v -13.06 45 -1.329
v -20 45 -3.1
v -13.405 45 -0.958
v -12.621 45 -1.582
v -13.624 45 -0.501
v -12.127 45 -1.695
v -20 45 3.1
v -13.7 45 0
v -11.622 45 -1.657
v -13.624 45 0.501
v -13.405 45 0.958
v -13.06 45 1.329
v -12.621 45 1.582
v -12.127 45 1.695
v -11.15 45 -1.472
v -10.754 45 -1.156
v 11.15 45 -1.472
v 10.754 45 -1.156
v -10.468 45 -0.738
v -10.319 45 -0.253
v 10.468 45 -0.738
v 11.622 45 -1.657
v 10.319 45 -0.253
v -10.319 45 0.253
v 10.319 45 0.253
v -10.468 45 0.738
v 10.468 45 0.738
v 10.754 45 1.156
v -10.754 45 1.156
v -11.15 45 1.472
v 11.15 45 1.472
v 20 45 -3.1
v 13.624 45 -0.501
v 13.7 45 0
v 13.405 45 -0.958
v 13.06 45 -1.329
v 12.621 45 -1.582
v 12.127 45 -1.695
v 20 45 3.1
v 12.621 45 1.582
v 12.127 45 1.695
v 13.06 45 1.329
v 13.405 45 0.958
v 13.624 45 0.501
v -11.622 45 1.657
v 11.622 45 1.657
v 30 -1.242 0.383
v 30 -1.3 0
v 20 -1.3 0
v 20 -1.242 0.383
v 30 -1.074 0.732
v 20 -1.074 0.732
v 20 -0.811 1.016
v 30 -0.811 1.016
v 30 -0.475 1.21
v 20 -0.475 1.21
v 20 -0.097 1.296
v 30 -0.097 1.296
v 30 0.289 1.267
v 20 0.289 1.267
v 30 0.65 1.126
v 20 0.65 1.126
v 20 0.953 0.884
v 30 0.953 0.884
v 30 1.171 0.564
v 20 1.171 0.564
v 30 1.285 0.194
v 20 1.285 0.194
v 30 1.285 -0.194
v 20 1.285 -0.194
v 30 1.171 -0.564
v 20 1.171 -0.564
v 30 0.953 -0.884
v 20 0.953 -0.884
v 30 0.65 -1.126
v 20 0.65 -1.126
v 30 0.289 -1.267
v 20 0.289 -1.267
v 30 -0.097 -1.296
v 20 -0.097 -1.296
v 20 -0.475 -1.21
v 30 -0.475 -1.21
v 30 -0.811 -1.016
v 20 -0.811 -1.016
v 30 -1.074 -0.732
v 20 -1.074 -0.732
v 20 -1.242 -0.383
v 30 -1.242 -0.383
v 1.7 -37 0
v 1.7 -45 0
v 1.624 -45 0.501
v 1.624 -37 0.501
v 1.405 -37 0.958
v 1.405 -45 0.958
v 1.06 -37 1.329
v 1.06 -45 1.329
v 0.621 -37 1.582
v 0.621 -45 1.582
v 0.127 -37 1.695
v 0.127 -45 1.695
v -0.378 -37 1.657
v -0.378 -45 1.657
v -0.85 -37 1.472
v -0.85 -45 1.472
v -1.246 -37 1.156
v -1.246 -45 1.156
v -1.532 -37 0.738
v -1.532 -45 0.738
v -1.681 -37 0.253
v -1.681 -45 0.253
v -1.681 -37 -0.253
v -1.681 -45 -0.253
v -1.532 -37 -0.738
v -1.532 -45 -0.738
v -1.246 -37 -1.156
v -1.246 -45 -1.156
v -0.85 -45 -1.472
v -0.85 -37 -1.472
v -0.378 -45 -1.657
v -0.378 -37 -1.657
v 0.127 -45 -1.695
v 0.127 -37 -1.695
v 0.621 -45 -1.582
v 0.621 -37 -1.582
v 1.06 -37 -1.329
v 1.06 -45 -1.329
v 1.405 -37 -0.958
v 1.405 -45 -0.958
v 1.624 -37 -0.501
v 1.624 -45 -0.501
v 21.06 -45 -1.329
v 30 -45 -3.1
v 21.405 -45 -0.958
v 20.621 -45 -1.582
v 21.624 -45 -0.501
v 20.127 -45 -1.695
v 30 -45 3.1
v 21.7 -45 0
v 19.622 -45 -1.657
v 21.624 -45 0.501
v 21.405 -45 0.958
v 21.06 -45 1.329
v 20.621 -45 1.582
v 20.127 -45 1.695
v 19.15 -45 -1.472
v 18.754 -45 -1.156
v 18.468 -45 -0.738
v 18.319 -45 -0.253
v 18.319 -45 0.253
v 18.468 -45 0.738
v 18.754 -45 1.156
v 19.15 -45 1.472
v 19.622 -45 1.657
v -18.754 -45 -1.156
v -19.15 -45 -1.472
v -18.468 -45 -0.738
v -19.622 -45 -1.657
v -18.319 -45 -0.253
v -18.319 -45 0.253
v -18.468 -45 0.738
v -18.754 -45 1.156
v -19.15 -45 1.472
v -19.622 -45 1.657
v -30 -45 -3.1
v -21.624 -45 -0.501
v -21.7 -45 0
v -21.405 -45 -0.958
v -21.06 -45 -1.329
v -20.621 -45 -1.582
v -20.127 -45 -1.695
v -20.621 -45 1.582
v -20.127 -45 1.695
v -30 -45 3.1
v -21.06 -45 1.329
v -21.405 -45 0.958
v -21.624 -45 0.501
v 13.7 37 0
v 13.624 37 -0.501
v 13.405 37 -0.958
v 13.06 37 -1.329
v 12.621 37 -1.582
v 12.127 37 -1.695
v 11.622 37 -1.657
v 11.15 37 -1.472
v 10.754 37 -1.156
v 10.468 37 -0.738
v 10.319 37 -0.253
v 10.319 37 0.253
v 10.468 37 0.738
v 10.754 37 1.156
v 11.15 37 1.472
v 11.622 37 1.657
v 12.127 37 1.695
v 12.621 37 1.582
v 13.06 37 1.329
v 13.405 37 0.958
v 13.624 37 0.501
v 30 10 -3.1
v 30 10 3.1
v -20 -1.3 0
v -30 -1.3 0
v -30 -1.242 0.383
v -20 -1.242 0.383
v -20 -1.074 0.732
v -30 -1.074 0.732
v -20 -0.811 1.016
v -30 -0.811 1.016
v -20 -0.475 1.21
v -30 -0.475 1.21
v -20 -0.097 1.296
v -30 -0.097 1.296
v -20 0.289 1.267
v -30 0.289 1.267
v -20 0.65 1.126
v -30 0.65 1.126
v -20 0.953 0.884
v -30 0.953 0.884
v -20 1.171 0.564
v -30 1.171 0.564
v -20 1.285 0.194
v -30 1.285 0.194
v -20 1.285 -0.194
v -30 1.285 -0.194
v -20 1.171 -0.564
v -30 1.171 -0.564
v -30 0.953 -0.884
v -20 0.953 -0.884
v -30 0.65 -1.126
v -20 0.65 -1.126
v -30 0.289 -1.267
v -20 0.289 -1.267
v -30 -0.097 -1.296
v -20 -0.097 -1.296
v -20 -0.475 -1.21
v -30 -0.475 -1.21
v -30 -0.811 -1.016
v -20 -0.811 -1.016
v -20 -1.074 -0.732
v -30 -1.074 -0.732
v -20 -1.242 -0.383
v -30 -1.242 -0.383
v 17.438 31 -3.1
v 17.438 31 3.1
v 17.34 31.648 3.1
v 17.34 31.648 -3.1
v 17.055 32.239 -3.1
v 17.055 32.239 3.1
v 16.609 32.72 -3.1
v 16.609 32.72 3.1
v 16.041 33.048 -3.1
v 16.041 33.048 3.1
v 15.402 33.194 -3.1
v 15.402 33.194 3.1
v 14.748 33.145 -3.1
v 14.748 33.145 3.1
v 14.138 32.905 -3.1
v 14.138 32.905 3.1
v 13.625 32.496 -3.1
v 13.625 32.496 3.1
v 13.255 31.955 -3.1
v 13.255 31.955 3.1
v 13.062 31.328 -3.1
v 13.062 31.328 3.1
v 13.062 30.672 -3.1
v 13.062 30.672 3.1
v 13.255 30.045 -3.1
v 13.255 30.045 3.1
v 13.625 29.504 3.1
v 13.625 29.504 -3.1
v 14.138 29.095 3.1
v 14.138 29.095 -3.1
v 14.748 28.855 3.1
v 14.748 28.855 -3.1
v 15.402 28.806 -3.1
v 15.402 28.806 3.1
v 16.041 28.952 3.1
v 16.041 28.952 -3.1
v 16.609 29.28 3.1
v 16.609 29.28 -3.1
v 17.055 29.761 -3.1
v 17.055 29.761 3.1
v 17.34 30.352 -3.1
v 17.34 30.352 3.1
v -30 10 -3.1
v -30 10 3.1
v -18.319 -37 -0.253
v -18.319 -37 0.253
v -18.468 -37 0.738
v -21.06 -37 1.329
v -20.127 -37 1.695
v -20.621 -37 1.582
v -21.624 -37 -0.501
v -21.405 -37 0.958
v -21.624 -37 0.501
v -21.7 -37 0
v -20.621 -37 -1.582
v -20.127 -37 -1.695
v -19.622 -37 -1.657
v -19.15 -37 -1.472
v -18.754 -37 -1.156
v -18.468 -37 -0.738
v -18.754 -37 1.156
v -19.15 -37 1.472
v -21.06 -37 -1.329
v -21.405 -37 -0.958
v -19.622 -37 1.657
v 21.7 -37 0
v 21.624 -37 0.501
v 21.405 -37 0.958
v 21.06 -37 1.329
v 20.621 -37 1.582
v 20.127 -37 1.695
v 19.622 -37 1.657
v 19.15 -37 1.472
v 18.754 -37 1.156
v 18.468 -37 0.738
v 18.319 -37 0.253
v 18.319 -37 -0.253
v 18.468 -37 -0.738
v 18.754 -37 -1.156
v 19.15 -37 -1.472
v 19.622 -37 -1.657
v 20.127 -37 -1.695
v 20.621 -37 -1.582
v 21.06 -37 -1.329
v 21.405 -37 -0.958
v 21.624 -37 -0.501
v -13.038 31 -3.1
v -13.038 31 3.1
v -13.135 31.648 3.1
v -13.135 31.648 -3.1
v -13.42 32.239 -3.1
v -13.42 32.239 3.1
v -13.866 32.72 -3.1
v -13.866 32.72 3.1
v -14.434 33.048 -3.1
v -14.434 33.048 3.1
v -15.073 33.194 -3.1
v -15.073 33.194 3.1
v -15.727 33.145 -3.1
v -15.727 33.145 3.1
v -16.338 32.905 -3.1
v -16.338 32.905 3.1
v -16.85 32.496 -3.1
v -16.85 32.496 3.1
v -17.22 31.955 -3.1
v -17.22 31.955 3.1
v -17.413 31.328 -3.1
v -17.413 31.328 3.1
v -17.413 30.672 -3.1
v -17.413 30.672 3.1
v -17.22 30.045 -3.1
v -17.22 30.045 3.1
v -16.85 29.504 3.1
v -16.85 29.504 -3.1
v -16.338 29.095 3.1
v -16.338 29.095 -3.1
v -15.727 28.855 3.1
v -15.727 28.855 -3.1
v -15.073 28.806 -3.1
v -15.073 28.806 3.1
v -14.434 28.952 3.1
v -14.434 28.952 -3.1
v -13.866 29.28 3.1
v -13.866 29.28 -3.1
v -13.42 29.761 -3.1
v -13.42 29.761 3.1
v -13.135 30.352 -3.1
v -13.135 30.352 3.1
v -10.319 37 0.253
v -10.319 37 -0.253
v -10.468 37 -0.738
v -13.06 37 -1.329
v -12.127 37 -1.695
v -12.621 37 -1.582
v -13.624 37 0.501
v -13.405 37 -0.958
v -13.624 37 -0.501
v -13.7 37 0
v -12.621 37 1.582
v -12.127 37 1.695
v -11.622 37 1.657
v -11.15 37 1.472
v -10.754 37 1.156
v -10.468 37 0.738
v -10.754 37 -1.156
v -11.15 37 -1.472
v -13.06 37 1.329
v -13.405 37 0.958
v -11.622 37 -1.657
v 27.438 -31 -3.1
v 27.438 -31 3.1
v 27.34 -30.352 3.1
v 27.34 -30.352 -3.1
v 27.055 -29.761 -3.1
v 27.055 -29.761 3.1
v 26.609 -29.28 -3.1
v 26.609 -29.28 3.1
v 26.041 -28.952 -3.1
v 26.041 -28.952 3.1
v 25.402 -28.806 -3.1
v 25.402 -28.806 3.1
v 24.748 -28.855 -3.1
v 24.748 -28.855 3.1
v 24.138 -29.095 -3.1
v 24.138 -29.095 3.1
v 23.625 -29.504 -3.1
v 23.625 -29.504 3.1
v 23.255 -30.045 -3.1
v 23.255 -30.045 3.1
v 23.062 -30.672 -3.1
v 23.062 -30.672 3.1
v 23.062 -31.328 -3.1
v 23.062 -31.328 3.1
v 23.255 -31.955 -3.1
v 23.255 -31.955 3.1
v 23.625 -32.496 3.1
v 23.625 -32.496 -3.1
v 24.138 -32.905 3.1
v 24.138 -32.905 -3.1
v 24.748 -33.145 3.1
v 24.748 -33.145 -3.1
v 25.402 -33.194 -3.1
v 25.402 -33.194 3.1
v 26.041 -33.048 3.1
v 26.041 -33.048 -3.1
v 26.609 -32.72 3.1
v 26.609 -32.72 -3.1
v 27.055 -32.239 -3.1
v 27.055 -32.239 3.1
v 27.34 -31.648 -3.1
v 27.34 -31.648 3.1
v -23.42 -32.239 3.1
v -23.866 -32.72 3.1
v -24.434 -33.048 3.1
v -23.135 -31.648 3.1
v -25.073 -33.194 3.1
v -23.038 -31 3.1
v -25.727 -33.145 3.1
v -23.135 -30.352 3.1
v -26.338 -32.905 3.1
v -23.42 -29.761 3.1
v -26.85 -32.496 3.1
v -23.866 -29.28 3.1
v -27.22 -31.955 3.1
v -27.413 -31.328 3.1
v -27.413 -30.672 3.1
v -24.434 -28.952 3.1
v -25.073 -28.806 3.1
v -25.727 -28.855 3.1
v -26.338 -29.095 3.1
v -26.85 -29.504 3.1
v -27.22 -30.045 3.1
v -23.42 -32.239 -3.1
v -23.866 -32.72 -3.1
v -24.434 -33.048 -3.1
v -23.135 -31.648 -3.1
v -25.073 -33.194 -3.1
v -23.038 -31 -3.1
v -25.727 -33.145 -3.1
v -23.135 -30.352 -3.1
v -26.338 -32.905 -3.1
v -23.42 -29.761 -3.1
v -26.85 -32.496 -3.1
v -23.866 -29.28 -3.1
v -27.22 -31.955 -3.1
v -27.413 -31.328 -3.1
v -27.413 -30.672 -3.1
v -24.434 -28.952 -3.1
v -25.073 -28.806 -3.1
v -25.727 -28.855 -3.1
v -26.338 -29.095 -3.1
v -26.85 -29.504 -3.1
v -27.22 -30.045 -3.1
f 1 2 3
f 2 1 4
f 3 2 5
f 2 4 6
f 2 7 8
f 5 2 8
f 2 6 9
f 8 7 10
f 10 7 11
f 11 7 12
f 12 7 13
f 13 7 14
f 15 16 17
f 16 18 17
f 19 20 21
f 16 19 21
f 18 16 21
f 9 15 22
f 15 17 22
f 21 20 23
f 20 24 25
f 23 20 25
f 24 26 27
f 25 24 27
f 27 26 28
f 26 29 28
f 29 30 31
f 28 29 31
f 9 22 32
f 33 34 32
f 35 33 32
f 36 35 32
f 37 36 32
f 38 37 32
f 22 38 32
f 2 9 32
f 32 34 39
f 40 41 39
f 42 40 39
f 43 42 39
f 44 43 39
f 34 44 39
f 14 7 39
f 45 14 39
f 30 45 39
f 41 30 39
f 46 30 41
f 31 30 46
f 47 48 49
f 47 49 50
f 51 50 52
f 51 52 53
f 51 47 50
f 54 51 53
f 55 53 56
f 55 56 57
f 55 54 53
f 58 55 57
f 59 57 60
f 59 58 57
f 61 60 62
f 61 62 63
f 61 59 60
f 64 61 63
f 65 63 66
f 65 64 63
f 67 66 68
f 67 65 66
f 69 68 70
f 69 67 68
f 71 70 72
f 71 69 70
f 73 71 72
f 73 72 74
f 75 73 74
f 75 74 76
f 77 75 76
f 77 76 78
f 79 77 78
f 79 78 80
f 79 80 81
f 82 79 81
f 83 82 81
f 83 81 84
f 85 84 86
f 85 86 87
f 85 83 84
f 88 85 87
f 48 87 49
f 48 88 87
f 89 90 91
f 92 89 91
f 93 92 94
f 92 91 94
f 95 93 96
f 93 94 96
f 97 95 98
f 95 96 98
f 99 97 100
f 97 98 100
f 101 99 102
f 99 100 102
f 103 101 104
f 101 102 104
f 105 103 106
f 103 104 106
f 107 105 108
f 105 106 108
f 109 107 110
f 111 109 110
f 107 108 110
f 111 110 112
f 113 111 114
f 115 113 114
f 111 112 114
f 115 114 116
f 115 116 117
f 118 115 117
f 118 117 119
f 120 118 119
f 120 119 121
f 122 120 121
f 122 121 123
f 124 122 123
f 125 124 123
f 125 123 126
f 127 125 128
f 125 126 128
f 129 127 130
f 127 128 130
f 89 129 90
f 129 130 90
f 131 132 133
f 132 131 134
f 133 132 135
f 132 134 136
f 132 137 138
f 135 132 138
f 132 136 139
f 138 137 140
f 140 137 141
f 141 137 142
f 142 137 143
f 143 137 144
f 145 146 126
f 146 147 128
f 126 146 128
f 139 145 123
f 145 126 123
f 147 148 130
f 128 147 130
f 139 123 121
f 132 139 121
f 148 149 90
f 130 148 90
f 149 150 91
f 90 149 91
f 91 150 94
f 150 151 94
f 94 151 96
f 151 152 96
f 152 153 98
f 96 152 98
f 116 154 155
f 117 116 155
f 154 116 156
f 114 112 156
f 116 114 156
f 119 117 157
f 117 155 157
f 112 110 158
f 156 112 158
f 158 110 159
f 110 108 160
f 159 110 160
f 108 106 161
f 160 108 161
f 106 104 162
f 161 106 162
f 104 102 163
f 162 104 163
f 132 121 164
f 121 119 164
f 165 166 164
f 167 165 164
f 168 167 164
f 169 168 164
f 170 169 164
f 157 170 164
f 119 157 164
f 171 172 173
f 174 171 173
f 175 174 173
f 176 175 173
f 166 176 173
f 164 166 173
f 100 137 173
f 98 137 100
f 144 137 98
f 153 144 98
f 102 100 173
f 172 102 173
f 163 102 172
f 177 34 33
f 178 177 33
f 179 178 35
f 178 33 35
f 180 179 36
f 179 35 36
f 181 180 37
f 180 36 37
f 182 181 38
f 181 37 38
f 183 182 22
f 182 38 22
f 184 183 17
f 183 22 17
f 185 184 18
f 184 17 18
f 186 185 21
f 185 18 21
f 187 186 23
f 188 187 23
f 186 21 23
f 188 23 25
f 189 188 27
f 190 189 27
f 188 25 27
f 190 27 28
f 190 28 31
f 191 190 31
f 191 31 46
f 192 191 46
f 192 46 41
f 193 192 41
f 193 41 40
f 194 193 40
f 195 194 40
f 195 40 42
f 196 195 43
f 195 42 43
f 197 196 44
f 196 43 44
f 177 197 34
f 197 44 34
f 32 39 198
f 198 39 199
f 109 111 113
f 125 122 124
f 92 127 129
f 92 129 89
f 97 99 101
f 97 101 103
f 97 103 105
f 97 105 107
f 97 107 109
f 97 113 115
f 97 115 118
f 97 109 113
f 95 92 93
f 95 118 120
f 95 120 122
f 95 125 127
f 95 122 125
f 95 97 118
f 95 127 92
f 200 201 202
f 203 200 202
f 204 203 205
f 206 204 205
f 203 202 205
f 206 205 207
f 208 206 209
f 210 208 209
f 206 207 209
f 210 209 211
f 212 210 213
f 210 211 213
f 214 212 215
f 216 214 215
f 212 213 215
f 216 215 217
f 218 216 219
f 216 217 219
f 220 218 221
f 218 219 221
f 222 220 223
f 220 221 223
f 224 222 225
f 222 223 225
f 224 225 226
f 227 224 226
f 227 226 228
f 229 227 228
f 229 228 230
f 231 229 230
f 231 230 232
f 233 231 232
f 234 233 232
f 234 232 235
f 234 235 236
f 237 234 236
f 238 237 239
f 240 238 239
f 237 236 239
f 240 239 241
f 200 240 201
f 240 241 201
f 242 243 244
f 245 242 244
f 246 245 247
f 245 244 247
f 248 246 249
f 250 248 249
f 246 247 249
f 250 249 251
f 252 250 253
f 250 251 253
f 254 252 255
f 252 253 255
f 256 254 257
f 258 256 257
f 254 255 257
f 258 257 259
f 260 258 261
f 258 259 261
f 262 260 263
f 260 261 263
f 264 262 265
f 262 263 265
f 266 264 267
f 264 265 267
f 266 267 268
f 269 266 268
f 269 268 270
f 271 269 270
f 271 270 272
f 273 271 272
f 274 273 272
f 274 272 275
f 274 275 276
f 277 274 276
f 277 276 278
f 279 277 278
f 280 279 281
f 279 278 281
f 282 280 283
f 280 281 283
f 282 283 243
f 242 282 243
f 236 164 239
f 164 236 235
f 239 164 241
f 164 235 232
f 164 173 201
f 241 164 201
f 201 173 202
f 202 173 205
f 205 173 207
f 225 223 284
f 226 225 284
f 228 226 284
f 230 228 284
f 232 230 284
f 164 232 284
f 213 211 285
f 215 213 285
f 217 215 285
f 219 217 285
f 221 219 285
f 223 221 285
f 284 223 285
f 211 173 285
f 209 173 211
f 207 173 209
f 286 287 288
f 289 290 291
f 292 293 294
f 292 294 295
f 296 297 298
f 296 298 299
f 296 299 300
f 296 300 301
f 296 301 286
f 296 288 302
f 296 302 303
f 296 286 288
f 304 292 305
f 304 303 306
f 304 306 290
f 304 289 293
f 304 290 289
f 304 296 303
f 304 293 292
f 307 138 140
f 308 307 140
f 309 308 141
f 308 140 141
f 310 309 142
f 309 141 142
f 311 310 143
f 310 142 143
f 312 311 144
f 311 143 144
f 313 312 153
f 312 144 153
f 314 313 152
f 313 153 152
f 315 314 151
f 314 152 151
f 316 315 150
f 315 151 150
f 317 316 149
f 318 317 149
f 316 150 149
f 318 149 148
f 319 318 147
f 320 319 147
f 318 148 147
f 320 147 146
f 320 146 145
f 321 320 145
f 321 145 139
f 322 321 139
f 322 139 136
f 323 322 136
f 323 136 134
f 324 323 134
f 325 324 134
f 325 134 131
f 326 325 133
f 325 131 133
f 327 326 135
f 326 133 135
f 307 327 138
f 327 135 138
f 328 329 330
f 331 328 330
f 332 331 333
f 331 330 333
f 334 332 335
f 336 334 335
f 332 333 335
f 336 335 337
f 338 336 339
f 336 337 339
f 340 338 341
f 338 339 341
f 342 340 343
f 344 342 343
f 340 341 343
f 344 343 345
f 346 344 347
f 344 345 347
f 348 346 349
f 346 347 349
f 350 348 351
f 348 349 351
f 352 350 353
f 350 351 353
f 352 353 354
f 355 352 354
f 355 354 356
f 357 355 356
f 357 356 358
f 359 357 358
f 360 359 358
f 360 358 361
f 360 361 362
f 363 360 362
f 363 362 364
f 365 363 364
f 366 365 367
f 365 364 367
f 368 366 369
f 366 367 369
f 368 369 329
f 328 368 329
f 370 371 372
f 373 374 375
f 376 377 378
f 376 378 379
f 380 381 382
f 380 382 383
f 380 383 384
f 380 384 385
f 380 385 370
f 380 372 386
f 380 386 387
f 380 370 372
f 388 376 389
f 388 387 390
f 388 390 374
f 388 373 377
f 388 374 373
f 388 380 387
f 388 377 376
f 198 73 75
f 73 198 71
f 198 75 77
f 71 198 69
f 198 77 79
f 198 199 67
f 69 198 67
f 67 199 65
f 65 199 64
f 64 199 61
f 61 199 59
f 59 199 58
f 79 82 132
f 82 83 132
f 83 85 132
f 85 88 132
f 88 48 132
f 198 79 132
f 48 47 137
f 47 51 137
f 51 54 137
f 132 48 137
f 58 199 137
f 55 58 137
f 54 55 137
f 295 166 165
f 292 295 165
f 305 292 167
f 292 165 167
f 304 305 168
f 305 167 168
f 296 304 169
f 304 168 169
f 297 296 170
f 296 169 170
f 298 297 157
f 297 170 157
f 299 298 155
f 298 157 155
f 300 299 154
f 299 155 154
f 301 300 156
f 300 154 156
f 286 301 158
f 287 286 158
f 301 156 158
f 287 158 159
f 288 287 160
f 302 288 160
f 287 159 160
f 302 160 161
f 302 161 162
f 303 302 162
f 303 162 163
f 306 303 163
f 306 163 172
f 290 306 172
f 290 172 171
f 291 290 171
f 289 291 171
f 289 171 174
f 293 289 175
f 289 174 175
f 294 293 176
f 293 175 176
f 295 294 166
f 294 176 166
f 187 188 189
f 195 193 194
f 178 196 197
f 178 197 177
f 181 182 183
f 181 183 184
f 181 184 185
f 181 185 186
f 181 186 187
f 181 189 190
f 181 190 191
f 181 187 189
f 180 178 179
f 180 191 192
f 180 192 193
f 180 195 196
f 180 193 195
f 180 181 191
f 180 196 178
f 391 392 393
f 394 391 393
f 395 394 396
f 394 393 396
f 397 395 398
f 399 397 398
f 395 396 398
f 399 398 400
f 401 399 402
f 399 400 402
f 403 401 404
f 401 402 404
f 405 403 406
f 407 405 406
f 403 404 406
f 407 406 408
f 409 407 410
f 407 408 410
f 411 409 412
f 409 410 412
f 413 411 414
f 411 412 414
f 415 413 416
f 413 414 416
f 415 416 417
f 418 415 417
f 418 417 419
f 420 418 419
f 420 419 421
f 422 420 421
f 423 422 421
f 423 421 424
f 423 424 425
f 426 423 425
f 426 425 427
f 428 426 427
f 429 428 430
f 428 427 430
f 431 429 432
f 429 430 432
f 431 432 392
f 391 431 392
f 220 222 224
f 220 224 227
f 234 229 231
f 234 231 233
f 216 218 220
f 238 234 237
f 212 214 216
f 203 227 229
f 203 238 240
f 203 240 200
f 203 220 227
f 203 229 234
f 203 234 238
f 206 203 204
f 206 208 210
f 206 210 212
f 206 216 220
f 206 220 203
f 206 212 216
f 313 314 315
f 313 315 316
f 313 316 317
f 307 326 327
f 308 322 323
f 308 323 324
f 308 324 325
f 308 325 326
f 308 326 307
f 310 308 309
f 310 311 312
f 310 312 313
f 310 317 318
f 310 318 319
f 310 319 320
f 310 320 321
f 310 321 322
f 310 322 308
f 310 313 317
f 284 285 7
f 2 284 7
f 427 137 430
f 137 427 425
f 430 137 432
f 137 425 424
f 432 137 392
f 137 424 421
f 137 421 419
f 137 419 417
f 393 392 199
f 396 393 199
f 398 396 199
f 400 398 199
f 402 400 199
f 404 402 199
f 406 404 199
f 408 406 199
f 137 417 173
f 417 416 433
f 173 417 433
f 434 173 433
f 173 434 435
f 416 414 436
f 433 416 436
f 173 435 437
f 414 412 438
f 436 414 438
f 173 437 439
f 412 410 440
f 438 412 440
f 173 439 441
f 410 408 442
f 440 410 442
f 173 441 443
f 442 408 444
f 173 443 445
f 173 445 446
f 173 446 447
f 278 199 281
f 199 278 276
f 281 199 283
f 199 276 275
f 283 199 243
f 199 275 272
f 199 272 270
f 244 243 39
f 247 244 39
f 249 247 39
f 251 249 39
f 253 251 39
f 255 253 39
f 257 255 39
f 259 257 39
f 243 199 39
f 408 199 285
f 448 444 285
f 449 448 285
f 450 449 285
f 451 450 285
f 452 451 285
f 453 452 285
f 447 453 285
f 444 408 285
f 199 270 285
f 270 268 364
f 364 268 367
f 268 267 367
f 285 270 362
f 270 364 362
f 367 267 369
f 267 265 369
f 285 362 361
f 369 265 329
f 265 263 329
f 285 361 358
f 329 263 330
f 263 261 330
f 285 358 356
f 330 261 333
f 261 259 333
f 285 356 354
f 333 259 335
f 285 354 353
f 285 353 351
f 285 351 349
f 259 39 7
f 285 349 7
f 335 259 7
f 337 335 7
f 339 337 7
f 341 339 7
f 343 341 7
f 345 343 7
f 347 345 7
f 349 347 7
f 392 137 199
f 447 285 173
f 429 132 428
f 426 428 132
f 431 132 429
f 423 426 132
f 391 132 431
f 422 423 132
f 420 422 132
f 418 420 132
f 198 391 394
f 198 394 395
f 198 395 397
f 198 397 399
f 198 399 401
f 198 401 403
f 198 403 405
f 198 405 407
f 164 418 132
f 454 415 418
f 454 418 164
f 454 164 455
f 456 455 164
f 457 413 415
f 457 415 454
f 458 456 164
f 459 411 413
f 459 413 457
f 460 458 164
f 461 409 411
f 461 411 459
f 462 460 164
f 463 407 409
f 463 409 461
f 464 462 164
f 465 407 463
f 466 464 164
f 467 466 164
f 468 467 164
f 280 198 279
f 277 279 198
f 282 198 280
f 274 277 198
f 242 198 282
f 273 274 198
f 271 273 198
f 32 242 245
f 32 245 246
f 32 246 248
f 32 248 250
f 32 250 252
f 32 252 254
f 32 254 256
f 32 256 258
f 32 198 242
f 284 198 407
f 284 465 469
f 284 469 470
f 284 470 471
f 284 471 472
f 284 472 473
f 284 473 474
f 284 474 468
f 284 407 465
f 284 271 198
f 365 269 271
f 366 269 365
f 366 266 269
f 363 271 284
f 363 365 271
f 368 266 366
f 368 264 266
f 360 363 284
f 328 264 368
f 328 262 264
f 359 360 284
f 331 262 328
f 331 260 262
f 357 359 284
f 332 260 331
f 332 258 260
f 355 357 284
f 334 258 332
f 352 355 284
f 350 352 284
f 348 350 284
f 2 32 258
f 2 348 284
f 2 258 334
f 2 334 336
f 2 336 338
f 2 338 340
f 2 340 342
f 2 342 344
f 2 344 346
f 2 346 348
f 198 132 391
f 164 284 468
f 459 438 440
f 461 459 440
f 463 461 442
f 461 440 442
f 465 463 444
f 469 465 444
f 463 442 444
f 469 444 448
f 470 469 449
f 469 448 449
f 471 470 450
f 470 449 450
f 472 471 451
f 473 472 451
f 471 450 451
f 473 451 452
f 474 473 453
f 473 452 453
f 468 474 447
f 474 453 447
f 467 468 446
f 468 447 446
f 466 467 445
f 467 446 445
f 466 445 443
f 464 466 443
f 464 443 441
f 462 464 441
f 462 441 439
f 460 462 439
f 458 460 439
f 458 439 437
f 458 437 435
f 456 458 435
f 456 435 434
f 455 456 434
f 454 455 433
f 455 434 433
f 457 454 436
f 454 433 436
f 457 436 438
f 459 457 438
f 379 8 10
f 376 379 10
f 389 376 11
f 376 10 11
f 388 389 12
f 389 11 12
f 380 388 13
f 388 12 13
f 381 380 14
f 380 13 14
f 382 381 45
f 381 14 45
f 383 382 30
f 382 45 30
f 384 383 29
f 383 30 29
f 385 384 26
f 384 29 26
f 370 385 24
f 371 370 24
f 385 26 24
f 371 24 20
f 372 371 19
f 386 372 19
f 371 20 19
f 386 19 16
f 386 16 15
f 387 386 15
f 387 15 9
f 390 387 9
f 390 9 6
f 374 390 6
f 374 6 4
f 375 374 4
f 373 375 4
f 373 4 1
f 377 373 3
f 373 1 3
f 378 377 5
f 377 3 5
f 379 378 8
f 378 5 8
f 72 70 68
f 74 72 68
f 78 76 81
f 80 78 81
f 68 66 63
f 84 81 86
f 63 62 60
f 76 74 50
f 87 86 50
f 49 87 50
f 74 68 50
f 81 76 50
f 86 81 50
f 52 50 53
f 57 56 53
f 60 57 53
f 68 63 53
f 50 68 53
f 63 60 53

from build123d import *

# Parameters (mm, degrees)
EXTRUDE_1_4_DEPTH = 3.1
SKETCH4_R         = 1.7
M4_DRILL_DEPTH    = 8
SKETCH5_R         = 1.7
M4_DRILL2_DEPTH   = 8
SKETCH6_R         = 2.2
M4_THROUGH_DEPTH  = 6.2
SKETCH7_R         = 1.3
M3_DRILL_DEPTH    = 10


with BuildPart() as part:
    # Sketch1 → 1/4 (new, symmetric)
    with BuildSketch(Plane.XY):
        Polygon((-20, 45), (20, 45), (30, 10), (30, -45), (-30, -45), (-30, 10), align=None)
    extrude(amount=EXTRUDE_1_4_DEPTH, both=True)

    # Sketch4 → M4_DRILL (cut)
    with BuildSketch(Plane(origin=(0, 45, 0), x_dir=(1, 0, 0), z_dir=(0, 1, 0))):
        with Locations(Location((-12, 0, 0), (0, 0, 180))):
            Circle(SKETCH4_R)
        with Locations((12, 0)):
            Circle(SKETCH4_R)
    extrude(amount=-M4_DRILL_DEPTH, mode=Mode.SUBTRACT)

    # Sketch5 → M4_DRILL2 (cut)
    with BuildSketch(Plane(origin=(0, -45, 0), x_dir=(-1, 0, 0), z_dir=(0, -1, 0))):
        with Locations(Location((-20, 0, 0), (0, 0, 180))):
            Circle(SKETCH5_R)
        with Locations((20, 0)):
            Circle(SKETCH5_R)
        with Locations(Location((0, 0, 0), (0, 0, 180))):
            Circle(SKETCH5_R)
    extrude(amount=-M4_DRILL2_DEPTH, mode=Mode.SUBTRACT)

    # Sketch6 → M4_through (cut)
    with BuildSketch(Plane.XY.offset(3.1)):
        with Locations((-25.2375, -31)):
            Circle(SKETCH6_R)
        with Locations((25.2375, -31)):
            Circle(SKETCH6_R)
        with Locations((-15.2375, 31)):
            Circle(SKETCH6_R)
        with Locations((15.2375, 31)):
            Circle(SKETCH6_R)
    extrude(amount=-M4_THROUGH_DEPTH, mode=Mode.SUBTRACT)

    # Sketch7 → M3_Drill (cut)
    with BuildSketch(Plane.ZY.offset(30)):
        with Locations(Location((0, 0, 0), (0, 0, 270))):
            Circle(SKETCH7_R)
    m3_drill = extrude(amount=-M3_DRILL_DEPTH, mode=Mode.SUBTRACT)

    # Mirror1: M3_Drill across plane
    add(m3_drill.mirror(Plane(origin=(0, 0, 0), x_dir=(0, 0, 1), z_dir=(1, 0, 0))), mode=Mode.SUBTRACT)


solid = part.part
